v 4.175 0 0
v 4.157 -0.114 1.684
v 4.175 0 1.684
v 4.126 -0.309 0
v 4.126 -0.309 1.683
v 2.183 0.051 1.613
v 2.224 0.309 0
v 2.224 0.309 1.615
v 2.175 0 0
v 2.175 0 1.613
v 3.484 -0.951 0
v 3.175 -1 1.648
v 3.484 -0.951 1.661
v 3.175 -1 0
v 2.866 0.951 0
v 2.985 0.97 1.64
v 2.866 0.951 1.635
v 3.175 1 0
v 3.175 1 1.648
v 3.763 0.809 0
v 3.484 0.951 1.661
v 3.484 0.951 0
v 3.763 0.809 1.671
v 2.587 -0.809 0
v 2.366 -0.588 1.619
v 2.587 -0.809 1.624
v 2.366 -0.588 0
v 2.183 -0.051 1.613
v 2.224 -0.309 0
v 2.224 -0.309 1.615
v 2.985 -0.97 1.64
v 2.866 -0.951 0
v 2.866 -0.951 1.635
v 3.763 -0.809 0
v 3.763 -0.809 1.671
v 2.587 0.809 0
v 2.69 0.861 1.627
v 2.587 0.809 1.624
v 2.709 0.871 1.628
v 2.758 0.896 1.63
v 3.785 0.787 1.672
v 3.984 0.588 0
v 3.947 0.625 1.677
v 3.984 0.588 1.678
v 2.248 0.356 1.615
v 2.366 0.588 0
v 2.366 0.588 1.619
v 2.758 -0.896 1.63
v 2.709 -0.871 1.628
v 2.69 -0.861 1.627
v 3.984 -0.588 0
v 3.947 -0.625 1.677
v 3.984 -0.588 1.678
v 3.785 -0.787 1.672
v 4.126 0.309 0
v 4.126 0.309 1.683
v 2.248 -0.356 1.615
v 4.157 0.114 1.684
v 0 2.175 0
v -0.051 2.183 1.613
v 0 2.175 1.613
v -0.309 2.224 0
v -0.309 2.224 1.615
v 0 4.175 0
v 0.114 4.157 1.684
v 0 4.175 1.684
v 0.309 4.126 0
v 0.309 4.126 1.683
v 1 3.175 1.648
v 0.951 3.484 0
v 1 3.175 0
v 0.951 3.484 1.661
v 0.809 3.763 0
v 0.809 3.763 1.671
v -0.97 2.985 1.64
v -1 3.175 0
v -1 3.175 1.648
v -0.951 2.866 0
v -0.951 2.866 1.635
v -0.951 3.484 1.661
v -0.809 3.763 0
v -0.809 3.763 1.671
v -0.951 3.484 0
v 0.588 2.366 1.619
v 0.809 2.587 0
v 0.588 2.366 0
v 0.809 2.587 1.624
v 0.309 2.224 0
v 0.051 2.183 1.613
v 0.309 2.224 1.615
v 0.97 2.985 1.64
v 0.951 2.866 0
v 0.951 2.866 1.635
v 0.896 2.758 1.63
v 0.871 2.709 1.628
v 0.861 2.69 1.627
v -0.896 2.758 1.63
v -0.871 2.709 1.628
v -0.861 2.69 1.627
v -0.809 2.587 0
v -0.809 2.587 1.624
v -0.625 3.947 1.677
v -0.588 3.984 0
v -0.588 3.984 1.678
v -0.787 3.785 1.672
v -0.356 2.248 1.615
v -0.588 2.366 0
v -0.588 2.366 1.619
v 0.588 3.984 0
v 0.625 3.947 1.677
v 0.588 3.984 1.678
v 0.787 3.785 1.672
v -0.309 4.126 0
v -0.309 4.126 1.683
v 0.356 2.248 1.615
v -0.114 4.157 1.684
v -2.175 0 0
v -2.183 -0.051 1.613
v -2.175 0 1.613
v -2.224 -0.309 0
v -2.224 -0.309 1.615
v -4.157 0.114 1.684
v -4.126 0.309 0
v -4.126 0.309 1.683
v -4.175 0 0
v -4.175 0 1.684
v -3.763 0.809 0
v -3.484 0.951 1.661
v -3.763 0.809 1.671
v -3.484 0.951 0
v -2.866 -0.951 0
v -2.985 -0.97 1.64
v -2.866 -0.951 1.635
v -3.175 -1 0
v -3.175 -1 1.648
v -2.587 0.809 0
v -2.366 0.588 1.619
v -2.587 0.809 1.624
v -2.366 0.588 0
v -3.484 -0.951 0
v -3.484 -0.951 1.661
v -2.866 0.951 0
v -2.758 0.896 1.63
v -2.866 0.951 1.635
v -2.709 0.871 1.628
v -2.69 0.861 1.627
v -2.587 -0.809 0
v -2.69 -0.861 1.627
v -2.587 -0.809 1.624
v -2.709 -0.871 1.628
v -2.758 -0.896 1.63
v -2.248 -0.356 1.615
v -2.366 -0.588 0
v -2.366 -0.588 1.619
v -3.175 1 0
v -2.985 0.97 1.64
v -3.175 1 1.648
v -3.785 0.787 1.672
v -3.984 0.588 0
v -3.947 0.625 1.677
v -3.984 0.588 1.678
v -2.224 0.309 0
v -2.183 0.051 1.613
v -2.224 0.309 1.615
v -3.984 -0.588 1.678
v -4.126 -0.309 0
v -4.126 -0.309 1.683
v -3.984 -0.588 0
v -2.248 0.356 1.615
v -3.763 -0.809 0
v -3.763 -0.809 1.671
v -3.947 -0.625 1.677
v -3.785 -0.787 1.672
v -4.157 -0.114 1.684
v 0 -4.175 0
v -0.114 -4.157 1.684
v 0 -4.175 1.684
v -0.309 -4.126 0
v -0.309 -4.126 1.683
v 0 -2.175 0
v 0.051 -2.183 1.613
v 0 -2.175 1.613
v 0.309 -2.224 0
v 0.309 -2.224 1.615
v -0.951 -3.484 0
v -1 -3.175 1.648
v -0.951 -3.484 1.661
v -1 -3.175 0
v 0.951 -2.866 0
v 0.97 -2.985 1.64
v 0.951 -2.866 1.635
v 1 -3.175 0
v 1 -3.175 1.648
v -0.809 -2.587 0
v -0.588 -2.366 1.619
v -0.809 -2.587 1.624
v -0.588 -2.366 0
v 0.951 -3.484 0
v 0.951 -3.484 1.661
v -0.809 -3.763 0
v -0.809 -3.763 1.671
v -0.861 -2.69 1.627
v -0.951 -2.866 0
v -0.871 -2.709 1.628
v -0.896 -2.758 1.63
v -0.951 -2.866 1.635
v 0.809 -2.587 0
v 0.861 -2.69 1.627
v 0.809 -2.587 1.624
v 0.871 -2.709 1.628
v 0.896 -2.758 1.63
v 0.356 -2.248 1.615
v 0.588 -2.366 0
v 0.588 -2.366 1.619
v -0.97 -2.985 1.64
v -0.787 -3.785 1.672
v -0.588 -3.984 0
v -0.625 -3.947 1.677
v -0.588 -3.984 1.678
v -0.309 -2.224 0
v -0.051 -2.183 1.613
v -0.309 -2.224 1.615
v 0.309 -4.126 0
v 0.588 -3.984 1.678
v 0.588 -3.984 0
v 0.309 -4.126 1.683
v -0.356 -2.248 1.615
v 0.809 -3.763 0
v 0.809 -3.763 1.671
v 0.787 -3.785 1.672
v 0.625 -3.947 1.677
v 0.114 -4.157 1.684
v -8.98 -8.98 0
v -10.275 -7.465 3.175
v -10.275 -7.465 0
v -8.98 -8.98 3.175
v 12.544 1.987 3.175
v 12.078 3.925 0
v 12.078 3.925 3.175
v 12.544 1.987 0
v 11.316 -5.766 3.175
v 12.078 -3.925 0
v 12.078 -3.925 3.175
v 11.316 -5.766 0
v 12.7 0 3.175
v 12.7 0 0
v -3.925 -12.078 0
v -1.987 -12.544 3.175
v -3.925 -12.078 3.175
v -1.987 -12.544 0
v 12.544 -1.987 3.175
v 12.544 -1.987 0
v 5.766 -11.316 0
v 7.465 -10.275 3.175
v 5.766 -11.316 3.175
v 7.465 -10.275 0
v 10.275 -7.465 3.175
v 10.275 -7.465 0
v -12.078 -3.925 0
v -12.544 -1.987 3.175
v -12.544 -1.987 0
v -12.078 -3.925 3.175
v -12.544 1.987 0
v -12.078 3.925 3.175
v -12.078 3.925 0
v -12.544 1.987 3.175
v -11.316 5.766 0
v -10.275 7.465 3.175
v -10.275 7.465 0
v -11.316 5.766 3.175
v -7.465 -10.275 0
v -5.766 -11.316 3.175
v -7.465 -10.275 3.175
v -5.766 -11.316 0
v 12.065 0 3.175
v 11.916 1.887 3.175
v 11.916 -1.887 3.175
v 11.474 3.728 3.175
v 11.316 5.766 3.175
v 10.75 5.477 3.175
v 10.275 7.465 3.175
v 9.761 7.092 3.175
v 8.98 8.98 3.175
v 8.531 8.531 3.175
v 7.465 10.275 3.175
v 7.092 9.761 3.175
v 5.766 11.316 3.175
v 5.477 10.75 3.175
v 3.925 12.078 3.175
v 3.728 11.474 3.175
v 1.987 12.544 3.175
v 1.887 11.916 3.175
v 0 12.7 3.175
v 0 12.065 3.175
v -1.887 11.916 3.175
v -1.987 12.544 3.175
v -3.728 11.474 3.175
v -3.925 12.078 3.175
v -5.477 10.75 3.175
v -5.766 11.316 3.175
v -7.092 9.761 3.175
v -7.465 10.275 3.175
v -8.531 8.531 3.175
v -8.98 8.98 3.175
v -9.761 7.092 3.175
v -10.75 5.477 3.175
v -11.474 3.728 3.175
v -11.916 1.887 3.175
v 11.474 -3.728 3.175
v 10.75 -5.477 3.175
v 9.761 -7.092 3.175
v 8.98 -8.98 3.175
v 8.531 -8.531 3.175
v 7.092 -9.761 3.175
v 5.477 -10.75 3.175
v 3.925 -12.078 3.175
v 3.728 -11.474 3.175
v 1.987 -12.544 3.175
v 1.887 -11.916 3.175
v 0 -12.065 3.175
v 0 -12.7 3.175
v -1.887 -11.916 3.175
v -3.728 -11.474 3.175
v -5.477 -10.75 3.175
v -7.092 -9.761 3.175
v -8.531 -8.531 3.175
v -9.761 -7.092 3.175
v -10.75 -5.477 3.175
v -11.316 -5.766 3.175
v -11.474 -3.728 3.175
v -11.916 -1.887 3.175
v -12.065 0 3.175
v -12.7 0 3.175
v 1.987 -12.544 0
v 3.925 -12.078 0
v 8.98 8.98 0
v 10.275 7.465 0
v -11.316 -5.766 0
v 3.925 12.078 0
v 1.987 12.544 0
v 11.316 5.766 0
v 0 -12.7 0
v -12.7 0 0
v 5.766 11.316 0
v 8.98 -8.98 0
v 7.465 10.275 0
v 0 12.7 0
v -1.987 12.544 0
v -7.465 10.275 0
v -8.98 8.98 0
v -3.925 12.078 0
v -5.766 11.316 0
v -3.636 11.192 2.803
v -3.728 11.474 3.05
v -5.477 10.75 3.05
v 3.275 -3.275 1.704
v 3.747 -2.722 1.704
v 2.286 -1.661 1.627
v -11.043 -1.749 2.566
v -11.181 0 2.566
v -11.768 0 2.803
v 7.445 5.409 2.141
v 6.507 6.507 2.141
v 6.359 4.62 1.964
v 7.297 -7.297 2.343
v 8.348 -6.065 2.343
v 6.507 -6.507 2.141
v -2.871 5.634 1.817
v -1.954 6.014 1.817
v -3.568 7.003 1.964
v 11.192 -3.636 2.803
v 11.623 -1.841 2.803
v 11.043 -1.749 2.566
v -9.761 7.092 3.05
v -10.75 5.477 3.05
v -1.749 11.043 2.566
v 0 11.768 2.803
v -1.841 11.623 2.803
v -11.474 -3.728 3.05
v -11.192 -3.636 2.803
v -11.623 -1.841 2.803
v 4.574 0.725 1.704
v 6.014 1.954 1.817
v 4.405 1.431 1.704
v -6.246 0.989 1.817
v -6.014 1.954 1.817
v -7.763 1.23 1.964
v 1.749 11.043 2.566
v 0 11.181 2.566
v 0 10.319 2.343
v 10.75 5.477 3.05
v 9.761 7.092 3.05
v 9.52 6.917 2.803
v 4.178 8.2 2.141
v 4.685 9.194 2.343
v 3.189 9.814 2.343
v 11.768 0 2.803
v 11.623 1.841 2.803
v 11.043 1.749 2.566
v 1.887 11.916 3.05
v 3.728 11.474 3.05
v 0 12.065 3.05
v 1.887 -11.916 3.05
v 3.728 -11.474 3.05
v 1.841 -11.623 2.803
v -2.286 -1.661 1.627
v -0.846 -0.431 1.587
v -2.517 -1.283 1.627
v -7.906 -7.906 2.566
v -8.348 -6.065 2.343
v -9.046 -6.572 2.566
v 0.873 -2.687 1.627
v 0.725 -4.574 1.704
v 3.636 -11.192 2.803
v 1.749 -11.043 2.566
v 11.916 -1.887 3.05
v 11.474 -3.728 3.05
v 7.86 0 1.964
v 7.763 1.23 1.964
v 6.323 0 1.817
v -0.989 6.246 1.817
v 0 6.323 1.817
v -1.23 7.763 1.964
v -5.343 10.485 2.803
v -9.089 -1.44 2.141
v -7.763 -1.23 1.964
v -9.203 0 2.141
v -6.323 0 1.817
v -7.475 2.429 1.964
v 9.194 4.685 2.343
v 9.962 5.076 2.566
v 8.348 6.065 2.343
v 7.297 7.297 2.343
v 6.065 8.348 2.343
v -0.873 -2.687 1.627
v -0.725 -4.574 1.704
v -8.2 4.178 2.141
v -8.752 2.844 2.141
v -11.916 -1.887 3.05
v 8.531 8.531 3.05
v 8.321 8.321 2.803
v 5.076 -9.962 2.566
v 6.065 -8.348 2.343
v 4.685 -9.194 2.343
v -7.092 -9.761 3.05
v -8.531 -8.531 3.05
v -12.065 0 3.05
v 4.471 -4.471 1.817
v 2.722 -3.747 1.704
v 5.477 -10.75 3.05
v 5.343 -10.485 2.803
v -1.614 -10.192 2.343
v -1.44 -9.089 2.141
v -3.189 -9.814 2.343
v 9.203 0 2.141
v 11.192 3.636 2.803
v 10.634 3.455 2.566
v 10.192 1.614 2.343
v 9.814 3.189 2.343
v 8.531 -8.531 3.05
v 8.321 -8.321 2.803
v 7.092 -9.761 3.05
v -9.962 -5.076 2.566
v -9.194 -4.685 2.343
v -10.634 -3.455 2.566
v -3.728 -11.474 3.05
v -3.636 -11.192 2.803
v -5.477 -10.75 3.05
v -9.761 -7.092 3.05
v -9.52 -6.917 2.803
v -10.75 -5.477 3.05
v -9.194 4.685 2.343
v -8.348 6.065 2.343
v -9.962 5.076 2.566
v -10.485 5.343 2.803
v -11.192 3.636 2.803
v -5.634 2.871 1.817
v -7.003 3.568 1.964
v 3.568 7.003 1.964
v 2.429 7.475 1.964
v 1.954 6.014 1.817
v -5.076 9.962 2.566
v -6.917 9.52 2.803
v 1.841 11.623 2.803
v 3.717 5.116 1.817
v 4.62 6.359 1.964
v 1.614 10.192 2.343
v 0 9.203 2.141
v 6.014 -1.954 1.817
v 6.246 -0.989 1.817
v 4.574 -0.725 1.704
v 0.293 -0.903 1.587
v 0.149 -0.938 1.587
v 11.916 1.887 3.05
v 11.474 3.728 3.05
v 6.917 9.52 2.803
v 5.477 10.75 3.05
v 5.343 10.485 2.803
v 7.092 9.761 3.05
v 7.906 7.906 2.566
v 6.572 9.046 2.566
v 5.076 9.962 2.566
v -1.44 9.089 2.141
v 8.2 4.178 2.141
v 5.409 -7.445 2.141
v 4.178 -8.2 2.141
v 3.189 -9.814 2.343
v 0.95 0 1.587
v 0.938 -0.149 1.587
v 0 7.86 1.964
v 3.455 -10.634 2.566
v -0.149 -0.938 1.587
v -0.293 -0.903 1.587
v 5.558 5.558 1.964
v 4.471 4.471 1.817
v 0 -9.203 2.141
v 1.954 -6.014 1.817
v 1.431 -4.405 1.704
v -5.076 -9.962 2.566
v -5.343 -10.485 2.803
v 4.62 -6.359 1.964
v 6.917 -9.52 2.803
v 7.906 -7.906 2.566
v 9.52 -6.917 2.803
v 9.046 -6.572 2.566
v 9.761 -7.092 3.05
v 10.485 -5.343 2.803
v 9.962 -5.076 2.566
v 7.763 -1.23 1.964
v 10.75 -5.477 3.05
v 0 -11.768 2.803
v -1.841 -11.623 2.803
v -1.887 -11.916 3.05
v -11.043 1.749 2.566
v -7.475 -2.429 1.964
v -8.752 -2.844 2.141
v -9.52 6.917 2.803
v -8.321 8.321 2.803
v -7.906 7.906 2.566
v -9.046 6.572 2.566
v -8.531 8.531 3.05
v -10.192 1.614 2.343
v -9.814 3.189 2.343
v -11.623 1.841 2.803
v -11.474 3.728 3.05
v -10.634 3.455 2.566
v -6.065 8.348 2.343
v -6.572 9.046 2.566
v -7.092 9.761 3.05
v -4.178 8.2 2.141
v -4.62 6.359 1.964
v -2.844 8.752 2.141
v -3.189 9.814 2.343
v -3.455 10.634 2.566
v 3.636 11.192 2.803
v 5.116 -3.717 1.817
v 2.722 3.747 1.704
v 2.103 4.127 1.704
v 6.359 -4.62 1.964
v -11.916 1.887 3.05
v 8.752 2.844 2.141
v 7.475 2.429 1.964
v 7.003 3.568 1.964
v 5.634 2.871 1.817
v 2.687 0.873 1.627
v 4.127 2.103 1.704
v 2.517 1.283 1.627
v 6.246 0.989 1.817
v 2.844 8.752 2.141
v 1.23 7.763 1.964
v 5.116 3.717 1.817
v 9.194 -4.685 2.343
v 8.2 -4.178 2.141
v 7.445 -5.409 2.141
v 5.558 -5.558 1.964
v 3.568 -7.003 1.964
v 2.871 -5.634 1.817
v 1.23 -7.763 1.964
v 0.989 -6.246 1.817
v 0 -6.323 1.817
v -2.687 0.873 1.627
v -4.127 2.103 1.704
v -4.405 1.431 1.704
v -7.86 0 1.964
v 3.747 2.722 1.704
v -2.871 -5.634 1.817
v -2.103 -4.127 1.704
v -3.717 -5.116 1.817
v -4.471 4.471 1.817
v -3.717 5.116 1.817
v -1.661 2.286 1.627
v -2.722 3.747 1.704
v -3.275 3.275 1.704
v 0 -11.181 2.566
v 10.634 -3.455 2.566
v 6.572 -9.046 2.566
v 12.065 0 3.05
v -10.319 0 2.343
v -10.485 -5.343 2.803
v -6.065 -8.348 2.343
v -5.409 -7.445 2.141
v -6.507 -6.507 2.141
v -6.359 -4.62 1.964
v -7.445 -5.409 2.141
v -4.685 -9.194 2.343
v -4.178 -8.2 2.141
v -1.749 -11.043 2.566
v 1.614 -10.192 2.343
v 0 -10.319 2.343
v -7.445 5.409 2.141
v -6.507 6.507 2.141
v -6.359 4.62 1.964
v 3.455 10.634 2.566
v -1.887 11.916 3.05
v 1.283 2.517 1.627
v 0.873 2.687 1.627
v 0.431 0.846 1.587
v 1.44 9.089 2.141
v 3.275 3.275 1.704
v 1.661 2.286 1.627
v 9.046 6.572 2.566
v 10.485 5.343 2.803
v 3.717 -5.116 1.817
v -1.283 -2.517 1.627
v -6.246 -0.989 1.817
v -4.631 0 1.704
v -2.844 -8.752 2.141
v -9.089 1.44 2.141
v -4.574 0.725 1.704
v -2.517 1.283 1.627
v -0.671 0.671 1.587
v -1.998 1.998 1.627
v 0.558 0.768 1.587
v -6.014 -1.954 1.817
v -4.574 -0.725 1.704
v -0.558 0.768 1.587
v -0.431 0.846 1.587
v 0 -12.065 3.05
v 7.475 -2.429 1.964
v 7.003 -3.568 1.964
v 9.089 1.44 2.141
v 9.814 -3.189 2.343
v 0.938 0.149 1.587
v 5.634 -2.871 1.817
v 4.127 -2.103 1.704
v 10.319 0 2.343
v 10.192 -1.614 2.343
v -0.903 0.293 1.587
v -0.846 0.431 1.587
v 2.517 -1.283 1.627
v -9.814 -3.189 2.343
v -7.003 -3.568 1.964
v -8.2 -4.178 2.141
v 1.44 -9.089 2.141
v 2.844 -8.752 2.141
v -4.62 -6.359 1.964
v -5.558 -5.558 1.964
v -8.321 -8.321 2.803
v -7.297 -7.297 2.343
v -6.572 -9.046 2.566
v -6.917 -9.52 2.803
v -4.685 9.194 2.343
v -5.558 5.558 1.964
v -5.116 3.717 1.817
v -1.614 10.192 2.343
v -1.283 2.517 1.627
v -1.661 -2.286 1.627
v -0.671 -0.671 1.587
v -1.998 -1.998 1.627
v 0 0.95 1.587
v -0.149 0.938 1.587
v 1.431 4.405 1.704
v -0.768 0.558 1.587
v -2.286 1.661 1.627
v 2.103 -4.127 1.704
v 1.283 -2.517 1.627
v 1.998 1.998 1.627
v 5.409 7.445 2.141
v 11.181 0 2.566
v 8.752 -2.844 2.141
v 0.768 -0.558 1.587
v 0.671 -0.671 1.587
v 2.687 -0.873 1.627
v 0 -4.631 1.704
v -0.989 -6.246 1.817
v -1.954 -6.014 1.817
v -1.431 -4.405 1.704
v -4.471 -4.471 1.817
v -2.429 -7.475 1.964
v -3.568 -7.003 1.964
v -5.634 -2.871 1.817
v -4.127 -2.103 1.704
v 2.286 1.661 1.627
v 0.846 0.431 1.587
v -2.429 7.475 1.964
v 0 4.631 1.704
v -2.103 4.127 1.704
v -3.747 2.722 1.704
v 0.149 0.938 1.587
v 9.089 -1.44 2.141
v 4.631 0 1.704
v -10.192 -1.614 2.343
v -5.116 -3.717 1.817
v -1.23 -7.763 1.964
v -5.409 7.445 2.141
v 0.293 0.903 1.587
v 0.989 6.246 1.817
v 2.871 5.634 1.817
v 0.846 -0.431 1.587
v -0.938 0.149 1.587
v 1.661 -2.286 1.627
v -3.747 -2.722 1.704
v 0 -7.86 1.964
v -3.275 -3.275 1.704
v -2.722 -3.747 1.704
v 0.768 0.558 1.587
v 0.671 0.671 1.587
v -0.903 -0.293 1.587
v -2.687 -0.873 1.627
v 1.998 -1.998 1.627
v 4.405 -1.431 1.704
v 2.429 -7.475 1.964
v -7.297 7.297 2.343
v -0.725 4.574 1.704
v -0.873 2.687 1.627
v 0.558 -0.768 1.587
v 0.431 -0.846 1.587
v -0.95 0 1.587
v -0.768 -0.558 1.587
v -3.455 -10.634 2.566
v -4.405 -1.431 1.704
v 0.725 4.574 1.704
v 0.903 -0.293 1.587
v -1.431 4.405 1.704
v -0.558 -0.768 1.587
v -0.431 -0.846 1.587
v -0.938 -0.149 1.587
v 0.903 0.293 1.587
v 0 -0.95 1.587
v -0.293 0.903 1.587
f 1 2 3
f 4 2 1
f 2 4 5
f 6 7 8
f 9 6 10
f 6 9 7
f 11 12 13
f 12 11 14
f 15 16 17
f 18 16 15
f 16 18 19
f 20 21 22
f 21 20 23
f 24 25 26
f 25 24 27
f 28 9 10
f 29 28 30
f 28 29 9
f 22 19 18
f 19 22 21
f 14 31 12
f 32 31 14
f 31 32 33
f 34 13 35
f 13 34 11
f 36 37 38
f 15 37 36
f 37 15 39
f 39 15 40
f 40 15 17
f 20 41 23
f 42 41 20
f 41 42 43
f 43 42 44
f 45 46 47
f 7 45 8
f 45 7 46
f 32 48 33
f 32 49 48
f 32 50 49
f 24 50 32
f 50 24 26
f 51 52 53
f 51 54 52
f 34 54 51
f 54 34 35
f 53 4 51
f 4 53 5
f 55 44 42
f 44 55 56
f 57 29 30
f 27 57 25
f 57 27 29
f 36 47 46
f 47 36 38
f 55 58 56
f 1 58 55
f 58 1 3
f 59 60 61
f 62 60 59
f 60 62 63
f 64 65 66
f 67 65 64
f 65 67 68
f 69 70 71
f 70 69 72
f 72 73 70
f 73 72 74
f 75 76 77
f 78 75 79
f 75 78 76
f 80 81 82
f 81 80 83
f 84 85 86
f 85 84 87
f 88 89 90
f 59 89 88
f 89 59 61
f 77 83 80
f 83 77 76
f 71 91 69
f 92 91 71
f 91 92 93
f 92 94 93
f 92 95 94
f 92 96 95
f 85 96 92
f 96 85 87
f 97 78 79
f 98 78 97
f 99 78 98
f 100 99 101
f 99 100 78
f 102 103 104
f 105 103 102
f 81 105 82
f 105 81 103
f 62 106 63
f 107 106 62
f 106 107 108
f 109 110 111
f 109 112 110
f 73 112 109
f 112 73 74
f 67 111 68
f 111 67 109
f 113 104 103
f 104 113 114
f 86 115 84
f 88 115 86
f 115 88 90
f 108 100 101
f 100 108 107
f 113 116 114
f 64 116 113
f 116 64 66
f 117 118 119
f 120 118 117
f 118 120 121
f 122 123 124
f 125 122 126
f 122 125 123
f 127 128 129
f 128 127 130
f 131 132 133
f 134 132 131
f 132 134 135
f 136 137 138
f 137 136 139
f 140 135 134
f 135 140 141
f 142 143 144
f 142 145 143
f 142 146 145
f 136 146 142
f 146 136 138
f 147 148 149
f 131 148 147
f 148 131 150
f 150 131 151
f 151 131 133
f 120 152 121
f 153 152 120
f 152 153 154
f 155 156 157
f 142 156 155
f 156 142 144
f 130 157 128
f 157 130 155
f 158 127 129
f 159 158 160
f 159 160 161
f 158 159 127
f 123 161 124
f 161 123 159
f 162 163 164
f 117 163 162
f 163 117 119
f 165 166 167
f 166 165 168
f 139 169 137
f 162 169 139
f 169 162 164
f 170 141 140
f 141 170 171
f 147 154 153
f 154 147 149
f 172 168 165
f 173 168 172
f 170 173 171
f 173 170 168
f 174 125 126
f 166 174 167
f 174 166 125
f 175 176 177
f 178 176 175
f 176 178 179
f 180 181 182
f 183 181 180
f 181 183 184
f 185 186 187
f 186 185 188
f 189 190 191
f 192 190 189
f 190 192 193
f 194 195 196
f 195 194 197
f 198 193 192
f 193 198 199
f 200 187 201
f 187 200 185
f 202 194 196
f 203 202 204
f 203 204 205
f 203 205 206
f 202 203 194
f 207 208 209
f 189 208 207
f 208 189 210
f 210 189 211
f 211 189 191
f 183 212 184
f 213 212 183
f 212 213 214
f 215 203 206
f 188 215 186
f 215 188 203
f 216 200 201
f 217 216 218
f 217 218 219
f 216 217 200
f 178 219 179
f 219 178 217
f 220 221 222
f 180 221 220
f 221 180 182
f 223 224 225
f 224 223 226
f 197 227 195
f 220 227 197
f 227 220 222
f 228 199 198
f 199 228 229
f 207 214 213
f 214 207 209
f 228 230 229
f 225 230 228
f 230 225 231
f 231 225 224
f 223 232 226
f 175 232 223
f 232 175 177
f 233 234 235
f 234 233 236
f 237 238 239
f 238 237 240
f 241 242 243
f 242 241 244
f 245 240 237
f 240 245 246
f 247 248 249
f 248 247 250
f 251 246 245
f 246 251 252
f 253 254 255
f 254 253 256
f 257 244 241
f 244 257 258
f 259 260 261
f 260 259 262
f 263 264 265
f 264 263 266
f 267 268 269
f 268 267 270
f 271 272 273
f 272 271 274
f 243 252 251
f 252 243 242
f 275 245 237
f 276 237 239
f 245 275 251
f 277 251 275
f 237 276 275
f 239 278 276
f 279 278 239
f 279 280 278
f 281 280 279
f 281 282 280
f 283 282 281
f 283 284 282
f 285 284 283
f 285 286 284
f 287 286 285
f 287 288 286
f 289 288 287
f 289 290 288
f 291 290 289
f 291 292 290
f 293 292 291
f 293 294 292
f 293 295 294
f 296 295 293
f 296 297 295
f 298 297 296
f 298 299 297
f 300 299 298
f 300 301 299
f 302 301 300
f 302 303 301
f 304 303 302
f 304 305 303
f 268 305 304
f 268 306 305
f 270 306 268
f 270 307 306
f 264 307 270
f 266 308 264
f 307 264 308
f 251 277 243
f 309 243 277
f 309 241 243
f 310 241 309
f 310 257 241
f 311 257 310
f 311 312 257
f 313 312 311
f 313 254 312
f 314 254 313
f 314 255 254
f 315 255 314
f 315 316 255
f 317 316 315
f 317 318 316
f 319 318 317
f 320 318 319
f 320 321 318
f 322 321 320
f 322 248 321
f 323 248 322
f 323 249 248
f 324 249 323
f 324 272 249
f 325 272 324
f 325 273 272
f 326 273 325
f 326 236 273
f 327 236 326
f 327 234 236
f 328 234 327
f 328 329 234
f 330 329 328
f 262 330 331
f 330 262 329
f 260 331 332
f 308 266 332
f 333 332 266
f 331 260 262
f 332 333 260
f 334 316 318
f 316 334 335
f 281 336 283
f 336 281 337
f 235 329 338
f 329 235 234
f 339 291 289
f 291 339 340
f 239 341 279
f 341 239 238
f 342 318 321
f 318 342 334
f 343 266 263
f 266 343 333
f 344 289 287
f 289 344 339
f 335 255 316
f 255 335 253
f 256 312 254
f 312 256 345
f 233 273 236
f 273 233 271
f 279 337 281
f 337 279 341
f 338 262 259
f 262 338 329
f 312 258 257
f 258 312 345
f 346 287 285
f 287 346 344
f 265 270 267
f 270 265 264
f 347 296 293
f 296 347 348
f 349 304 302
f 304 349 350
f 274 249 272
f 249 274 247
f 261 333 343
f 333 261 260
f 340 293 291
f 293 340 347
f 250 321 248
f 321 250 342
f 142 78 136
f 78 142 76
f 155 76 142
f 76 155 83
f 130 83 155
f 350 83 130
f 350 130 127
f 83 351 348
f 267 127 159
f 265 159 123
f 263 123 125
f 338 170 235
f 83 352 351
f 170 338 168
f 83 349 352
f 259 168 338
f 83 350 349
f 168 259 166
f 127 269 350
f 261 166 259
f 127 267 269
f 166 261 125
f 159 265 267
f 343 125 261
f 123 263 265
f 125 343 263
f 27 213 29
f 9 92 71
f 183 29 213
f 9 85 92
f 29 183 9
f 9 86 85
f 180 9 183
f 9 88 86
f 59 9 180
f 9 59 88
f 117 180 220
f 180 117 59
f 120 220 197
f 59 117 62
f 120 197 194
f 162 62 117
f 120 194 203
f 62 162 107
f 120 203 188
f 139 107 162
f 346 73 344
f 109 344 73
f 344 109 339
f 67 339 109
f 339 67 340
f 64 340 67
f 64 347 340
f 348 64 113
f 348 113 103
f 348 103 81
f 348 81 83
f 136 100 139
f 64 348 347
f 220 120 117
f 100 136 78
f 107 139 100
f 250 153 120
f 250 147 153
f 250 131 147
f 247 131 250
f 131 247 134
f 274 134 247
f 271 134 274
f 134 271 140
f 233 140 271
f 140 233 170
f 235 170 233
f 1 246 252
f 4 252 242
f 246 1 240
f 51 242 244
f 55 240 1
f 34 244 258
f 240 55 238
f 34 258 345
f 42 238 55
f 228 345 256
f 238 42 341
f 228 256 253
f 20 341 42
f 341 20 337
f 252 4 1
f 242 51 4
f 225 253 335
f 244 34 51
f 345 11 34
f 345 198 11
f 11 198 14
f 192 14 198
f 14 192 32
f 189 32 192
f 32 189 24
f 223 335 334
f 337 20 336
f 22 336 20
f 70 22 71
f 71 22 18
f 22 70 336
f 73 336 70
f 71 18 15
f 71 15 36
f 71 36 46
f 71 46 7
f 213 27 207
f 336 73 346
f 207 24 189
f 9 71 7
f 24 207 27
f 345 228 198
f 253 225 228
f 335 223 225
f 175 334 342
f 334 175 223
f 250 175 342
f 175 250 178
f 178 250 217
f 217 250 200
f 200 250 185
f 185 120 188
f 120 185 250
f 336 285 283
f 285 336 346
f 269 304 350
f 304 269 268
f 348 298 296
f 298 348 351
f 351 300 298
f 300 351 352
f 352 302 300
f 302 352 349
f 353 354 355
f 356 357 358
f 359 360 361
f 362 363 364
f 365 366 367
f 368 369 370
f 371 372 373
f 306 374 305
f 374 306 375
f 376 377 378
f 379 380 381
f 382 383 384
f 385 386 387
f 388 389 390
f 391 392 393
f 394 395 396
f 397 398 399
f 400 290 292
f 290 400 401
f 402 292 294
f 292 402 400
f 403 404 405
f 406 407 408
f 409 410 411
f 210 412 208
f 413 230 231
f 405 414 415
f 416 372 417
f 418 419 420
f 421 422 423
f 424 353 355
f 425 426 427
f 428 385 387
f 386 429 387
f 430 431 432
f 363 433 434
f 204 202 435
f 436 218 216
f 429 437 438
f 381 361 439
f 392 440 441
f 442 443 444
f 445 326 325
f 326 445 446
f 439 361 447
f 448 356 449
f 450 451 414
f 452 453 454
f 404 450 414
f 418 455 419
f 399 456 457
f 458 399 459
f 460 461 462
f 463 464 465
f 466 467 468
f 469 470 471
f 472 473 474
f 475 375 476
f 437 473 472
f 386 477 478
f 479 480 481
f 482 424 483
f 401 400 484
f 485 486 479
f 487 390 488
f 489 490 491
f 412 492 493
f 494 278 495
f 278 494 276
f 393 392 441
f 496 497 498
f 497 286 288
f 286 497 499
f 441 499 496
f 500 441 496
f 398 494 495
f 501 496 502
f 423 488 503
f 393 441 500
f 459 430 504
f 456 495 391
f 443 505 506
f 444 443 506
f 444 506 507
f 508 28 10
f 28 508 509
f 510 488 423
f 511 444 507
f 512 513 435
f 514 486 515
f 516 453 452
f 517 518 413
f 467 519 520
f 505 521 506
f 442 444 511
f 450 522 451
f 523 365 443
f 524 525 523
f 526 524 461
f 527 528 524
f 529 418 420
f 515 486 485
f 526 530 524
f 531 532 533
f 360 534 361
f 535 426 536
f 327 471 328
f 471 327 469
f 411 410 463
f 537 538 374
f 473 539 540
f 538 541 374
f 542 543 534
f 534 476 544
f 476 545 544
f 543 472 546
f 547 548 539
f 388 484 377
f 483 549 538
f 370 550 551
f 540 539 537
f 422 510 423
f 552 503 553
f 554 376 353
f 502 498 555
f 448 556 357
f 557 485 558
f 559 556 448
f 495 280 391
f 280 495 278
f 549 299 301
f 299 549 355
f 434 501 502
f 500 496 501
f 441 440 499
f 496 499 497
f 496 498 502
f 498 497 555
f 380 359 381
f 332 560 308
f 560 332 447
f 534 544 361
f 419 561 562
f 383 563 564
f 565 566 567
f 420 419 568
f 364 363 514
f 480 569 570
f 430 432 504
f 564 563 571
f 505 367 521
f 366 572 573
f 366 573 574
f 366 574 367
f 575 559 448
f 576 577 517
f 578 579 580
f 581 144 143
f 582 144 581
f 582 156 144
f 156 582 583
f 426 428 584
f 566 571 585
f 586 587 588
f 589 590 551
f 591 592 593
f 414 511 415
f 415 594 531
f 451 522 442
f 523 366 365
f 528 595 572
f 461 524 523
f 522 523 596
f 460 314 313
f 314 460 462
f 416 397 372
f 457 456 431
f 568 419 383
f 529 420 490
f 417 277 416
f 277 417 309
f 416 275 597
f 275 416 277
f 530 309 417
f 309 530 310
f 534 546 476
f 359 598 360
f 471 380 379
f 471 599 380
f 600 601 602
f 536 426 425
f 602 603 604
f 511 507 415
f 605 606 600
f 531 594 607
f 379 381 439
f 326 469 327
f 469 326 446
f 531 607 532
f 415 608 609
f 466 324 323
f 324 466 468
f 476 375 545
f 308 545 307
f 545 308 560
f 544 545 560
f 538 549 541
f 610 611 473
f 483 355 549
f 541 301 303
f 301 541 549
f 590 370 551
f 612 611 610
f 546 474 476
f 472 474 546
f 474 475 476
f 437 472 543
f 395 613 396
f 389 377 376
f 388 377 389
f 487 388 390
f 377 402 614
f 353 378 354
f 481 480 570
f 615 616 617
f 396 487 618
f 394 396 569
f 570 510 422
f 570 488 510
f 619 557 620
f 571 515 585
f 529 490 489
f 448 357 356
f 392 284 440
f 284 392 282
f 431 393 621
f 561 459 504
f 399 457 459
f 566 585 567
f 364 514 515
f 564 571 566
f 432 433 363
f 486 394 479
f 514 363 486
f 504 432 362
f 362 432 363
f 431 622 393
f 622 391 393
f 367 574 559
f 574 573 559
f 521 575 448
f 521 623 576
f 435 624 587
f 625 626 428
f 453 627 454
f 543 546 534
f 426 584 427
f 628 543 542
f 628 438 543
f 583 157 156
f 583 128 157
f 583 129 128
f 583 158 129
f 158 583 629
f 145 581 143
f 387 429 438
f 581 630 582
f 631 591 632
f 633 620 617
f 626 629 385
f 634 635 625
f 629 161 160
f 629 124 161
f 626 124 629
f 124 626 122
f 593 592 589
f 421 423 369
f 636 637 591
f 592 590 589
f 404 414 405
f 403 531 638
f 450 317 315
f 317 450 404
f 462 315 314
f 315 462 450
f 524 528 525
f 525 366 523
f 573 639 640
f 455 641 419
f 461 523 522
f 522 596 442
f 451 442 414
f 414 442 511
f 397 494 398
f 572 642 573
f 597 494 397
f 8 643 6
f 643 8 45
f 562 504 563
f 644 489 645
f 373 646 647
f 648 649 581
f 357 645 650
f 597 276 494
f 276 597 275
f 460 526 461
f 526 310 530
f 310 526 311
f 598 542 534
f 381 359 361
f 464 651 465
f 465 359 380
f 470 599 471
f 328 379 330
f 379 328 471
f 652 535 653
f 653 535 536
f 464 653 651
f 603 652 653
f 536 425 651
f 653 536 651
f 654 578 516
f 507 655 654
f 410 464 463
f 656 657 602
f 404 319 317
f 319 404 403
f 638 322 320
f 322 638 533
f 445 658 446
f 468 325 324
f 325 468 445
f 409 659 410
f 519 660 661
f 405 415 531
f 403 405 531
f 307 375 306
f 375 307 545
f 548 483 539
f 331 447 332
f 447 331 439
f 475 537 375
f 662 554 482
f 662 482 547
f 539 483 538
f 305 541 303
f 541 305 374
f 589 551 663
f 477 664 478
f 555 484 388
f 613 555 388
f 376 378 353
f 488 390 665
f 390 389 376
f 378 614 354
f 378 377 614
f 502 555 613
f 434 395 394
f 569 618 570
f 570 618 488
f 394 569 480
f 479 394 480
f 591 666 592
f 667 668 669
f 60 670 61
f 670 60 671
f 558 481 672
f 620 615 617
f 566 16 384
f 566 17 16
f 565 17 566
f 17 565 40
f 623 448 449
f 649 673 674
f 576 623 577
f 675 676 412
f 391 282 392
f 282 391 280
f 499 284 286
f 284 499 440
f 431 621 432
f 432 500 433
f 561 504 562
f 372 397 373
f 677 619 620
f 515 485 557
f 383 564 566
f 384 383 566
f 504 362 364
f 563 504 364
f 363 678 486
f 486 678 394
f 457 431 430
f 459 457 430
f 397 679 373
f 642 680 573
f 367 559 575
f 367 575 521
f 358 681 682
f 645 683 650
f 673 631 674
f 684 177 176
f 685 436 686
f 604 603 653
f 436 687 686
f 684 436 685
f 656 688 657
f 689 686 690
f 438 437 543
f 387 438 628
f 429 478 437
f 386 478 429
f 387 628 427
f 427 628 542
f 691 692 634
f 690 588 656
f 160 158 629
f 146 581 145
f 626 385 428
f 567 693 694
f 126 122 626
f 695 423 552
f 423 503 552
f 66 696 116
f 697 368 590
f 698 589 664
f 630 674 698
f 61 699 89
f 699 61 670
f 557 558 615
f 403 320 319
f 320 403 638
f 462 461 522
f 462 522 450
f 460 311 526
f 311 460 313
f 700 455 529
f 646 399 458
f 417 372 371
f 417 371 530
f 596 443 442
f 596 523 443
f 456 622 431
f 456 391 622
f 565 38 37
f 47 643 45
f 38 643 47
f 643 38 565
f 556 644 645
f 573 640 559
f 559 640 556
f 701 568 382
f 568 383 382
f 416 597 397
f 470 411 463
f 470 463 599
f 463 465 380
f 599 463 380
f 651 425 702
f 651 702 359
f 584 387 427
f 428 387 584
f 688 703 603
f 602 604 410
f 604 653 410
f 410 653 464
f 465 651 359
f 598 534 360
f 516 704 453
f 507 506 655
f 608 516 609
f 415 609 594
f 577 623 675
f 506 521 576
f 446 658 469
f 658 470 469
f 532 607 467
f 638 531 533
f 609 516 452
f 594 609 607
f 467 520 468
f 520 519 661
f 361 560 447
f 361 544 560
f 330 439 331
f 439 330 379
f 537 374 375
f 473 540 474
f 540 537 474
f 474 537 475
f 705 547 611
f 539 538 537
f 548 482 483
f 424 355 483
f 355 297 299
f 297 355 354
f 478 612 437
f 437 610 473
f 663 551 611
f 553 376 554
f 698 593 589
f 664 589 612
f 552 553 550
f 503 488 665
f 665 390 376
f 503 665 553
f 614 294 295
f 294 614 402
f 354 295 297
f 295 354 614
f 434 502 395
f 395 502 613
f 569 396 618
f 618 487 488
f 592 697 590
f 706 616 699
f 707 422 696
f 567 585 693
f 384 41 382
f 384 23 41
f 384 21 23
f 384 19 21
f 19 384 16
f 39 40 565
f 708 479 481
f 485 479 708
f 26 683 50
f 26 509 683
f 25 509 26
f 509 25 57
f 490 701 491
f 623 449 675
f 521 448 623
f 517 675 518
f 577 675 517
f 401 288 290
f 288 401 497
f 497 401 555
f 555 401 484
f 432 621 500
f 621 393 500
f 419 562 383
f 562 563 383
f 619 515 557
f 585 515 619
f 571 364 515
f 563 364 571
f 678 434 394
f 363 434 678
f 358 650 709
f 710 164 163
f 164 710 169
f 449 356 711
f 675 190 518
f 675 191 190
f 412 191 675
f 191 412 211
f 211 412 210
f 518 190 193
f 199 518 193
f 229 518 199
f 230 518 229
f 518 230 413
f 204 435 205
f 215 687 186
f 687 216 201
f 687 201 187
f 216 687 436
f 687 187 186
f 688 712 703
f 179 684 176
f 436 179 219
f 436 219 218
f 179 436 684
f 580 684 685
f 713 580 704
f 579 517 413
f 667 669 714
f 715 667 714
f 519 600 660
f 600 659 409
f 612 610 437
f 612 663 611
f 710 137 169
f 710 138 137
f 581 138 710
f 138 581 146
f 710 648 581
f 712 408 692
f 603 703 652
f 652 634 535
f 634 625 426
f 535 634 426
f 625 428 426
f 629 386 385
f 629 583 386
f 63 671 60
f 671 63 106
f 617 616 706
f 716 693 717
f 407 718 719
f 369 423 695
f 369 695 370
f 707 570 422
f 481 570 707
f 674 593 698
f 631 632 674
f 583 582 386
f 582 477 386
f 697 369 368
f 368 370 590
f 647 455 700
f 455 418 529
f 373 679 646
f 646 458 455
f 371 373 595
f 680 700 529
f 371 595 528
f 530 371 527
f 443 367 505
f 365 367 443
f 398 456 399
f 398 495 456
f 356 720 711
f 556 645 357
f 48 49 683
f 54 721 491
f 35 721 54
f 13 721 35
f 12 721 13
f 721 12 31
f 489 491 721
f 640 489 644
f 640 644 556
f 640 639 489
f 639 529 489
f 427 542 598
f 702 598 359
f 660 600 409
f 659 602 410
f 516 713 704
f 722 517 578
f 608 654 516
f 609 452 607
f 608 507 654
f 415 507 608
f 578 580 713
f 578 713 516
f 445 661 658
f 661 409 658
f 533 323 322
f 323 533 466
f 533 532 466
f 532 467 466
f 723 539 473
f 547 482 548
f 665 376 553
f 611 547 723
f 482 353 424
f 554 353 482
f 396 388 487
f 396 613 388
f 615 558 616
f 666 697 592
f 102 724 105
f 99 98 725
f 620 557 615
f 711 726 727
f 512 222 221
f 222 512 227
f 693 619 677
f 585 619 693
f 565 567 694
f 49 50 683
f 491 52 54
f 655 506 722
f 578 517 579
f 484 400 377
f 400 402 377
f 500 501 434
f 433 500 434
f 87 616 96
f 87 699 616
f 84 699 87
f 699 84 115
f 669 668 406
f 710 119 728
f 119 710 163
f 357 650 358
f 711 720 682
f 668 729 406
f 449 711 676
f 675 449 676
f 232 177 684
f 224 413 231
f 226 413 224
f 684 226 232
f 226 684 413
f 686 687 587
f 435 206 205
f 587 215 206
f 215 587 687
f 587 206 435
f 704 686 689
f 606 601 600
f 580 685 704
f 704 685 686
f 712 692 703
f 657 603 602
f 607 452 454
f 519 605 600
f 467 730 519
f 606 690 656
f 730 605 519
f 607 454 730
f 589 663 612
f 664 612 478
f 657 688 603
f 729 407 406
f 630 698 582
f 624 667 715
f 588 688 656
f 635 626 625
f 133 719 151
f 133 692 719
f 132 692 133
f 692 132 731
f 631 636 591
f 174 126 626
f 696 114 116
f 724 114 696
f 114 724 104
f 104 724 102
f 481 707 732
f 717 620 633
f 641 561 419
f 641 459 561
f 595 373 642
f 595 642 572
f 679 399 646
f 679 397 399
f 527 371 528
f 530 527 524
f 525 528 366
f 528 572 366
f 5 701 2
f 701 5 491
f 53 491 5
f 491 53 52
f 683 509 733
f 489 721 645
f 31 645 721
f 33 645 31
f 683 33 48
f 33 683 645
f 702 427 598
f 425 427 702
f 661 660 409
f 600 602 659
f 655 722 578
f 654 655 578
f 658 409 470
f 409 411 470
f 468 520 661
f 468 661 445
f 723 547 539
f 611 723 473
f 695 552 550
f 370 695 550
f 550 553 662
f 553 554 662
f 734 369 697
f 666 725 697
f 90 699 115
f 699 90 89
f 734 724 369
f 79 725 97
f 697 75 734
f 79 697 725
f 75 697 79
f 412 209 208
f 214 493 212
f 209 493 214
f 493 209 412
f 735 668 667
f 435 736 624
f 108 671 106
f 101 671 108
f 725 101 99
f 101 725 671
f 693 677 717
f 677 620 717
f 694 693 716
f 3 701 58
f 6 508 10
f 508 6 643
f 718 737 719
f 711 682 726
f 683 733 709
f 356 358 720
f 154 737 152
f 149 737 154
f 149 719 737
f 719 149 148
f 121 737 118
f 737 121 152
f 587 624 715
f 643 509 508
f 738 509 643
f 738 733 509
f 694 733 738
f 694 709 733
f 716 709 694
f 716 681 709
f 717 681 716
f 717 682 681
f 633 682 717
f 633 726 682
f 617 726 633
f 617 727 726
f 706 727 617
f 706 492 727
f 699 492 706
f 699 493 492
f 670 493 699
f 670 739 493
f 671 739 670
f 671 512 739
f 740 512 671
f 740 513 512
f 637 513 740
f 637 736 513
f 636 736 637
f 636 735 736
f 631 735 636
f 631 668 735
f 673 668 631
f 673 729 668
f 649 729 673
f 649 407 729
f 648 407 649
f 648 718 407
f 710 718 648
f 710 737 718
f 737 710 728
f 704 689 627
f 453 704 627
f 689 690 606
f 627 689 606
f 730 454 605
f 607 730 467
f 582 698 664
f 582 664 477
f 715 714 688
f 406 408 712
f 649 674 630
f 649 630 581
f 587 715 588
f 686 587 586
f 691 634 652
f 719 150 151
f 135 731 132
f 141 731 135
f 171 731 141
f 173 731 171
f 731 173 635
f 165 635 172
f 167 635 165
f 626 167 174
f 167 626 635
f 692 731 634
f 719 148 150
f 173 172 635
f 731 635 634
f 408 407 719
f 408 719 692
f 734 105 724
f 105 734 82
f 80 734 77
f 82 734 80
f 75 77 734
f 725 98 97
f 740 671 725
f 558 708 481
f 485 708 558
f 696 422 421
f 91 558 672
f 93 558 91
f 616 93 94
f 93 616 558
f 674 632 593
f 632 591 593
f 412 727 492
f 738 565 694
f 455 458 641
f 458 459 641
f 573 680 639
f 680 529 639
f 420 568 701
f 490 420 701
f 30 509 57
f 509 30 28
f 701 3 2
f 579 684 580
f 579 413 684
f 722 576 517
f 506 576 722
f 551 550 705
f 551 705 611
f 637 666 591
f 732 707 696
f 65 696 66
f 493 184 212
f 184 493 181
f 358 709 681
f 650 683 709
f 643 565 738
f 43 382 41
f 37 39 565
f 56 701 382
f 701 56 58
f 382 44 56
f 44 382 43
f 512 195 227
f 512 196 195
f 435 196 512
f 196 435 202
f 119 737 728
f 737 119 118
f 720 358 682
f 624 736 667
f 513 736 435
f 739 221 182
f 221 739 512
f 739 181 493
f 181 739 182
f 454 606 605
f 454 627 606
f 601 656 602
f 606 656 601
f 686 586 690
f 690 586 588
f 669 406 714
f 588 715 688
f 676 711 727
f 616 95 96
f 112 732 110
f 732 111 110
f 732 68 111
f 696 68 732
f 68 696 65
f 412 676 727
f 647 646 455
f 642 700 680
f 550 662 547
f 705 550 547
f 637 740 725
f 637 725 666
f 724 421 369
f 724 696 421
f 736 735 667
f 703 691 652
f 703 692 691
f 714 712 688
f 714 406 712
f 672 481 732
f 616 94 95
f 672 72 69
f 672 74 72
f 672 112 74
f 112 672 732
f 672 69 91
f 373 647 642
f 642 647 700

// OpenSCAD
/* [Size of button] */
//other shapes will be inscribed in a circle with that diameter
diameter_of_button = 1;
height_of_button = .125;
/*[holes in the button]*/
radi_to_center_of_hole = .125;
diameter_of_hole = .0625;
number_of_holes = 4; //[2:8]

/*[advanced features]*/
//only mess with if you dare ^_^
ignore_error_messages = 2;//[1:true,2:false]

button_shape = 0; //[0: circle, 1: 5 point star, 2: 6 point star, 3: triangle, 4: square, 5: pentagon, 6: hexagon, 8: octogon, 9: heart, 10: android, 11: (also not ready yet) apple]
resoultion = 40;//[5:100]
rounded_center = 1;//[1:true,2:false]
//won't be implemented (yet...)
number_of_Colors = 1;


/* [Unit adjustment] */
//Basically are you using american units or real units
units_entered = 25.4;//[1:mm, 10:cm, 1000:meter, 25.4:inch, 304.8:foot]

//default is mm for most printers
desired_units_for_output = 1;//[1:mm, .1:cm, 0.001:meter, 0.0393701:inch, 0.00328084:foot]
//CUSTOMIZER VARIABLES END

unit_conversion_factor = units_entered*desired_units_for_output;

module base_shape (type_of_shape = 0){
	linear_extrude(height_of_button*unit_conversion_factor){
		if(type_of_shape == 0){
			//circle
			circle(diameter_of_button*unit_conversion_factor/2,$fn=resoultion);
		}
		else if(type_of_shape ==1){
			//5 point star
			rotate([0,0,-90]){
				polygon([[0,.5],[.476,.155],[.294,-.405],[-.294,-.405],[-.476,.155]]*diameter_of_button*unit_conversion_factor,[[0,2,4,1,3]]);
				polygon([[.113,.156],[.182,-.059],[0,-.192],[-.182,-.059],[-.113,.156]]*diameter_of_button*unit_conversion_factor,[[0,1,2,3,4]]);
			}
		}
		else if(type_of_shape ==2){
			//6 point star
			circle(diameter_of_button*unit_conversion_factor/2,$fn=3);
			rotate([0,0,180]){
				circle(diameter_of_button*unit_conversion_factor/2,$fn=3);
			}
		}
		else if(type_of_shape ==3){
			//triangle
			circle(diameter_of_button*unit_conversion_factor/2,$fn=3);
		}
		else if(type_of_shape ==4){
			//square
			circle(diameter_of_button*unit_conversion_factor/2,$fn=4);
		}
		else if(type_of_shape ==5){
			//pentagon
			circle(diameter_of_button*unit_conversion_factor/2,$fn=5);
		}
		else if(type_of_shape ==6){
			//hexagon
			circle(diameter_of_button*unit_conversion_factor/2,$fn=6);
		}
		else if(type_of_shape ==8){
			//octogon
				circle(diameter_of_button*unit_conversion_factor/2,$fn=8);
		}
		/*else if(true){
			text("invalid shape of button");
		}*/
		else if(type_of_shape == 9){
			rotate([0,0,90]){
				scale([diameter_of_button*unit_conversion_factor,diameter_of_button*unit_conversion_factor,0]){
					polygon([[.433,.25],[0,-.5],[-.433,.25],[-.393,.302],[-.342,.342],[-.281,.366],[-.217,.375],[-.152,.366],[-.092,.342],[-.04,.302],[0,.25],[.04,.302],[.092,.342],[.152,.366],[.217,.375],[.281,.366],[.342,.342],[.393,.302]]);
				}
			}
		}
		else if(type_of_shape ==10){
			//android
			scale([diameter_of_button*unit_conversion_factor,diameter_of_button*unit_conversion_factor,0]){
				translate([.25,0,0]){
					//head
					circle(.25,$fn = resoultion);
				}
				//body
				square(.5,center=true);
				translate([0,.25+.0312,0]){
					//left arm
					polygon(points=[[-.125,-.03125],[-.125,.03125],[.125,.03125],[.125,-.03125]]);
					translate([.125,0,0]){
						circle(.03125,$fn = resoultion);
					}
					translate([-.125,0,0]){
						circle(.03125,$fn = resoultion);
					}
				}
				translate([0,-.25-.0312,0]){
					//right arm
					polygon(points=[[-.125,-.03125],[-.125,.03125],[.125,.03125],[.125,-.03125]]);
					translate([.125,0,0]){
						circle(.03125,$fn = resoultion);
					}
					translate([-.125,0,0]){
						circle(.03125,$fn = resoultion);
					}
				}
				translate([-.25,.125,0]){
					//left leg
					polygon(points=[[-.125,-.0625],[-.125,.0625],[.125,.0625],[.125,-.0625]]);
					translate([-.125,0,0]){
						circle(.0625,$fn = resoultion);
					}
				}
				translate([-.25,-.125,0]){
					//right leg
					polygon(points=[[-.125,-.0625],[-.125,.0625],[.125,.0625],[.125,-.0625]]);
					translate([-.125,0,0]){
						circle(.0625,$fn = resoultion);
					}
				}
			}
			
		}
		else if(type_of_shape ==11){
			
		}
		//7: (not implemeted yet) android, 8: (also not ready yet) apple
	}
}
module holes_to_be_cut(){
	if(number_of_holes<2){
		if(number_of_holes==1){
			translate([0,0,-.1*unit_conversion_factor]){
				linear_extrude((height_of_button+1)*unit_conversion_factor)
						circle([diameter_of_hole*unit_conversion_factor,diameter_of_hole*unit_conversion_factor],$fn=resoultion/2);
				}
			}
		}
	else{
		for(angle = [0:number_of_holes])
		{
			rotate([0,0,360/number_of_holes*angle]){
				translate([radi_to_center_of_hole*unit_conversion_factor,0,-.1*unit_conversion_factor]){
					linear_extrude((height_of_button+1)*unit_conversion_factor)
						circle([diameter_of_hole*unit_conversion_factor,diameter_of_hole*unit_conversion_factor],$fn=resoultion/2);
				}
			}
		}
	}
}
module round_center(){
	translate([0,0,diameter_of_button*unit_conversion_factor*.125]){
		resize(newsize=[diameter_of_button*unit_conversion_factor*.95,diameter_of_button*unit_conversion_factor*.95,height_of_button*unit_conversion_factor],center=true){
				sphere(diameter_of_button*unit_conversion_factor,$fn=resoultion);
		}
	}
}
//user error message, aka warning you broke it
if(ignore_error_messages==1){
	difference(){
		base_shape(type_of_shape =button_shape);
		holes_to_be_cut();
		if(rounded_center==1){
			round_center();
		}
	}
}
else if(diameter_of_button<(diameter_of_hole+radi_to_center_of_hole)){
	linear_extrude(2){
		text("you broke me! make sure the holes are inside of the button. To ignore me select so in advanced options");
	}
}
else{
	difference(){
		base_shape(type_of_shape =button_shape);
		holes_to_be_cut();
		if(rounded_center==1){
			round_center();
		}
	}
}
